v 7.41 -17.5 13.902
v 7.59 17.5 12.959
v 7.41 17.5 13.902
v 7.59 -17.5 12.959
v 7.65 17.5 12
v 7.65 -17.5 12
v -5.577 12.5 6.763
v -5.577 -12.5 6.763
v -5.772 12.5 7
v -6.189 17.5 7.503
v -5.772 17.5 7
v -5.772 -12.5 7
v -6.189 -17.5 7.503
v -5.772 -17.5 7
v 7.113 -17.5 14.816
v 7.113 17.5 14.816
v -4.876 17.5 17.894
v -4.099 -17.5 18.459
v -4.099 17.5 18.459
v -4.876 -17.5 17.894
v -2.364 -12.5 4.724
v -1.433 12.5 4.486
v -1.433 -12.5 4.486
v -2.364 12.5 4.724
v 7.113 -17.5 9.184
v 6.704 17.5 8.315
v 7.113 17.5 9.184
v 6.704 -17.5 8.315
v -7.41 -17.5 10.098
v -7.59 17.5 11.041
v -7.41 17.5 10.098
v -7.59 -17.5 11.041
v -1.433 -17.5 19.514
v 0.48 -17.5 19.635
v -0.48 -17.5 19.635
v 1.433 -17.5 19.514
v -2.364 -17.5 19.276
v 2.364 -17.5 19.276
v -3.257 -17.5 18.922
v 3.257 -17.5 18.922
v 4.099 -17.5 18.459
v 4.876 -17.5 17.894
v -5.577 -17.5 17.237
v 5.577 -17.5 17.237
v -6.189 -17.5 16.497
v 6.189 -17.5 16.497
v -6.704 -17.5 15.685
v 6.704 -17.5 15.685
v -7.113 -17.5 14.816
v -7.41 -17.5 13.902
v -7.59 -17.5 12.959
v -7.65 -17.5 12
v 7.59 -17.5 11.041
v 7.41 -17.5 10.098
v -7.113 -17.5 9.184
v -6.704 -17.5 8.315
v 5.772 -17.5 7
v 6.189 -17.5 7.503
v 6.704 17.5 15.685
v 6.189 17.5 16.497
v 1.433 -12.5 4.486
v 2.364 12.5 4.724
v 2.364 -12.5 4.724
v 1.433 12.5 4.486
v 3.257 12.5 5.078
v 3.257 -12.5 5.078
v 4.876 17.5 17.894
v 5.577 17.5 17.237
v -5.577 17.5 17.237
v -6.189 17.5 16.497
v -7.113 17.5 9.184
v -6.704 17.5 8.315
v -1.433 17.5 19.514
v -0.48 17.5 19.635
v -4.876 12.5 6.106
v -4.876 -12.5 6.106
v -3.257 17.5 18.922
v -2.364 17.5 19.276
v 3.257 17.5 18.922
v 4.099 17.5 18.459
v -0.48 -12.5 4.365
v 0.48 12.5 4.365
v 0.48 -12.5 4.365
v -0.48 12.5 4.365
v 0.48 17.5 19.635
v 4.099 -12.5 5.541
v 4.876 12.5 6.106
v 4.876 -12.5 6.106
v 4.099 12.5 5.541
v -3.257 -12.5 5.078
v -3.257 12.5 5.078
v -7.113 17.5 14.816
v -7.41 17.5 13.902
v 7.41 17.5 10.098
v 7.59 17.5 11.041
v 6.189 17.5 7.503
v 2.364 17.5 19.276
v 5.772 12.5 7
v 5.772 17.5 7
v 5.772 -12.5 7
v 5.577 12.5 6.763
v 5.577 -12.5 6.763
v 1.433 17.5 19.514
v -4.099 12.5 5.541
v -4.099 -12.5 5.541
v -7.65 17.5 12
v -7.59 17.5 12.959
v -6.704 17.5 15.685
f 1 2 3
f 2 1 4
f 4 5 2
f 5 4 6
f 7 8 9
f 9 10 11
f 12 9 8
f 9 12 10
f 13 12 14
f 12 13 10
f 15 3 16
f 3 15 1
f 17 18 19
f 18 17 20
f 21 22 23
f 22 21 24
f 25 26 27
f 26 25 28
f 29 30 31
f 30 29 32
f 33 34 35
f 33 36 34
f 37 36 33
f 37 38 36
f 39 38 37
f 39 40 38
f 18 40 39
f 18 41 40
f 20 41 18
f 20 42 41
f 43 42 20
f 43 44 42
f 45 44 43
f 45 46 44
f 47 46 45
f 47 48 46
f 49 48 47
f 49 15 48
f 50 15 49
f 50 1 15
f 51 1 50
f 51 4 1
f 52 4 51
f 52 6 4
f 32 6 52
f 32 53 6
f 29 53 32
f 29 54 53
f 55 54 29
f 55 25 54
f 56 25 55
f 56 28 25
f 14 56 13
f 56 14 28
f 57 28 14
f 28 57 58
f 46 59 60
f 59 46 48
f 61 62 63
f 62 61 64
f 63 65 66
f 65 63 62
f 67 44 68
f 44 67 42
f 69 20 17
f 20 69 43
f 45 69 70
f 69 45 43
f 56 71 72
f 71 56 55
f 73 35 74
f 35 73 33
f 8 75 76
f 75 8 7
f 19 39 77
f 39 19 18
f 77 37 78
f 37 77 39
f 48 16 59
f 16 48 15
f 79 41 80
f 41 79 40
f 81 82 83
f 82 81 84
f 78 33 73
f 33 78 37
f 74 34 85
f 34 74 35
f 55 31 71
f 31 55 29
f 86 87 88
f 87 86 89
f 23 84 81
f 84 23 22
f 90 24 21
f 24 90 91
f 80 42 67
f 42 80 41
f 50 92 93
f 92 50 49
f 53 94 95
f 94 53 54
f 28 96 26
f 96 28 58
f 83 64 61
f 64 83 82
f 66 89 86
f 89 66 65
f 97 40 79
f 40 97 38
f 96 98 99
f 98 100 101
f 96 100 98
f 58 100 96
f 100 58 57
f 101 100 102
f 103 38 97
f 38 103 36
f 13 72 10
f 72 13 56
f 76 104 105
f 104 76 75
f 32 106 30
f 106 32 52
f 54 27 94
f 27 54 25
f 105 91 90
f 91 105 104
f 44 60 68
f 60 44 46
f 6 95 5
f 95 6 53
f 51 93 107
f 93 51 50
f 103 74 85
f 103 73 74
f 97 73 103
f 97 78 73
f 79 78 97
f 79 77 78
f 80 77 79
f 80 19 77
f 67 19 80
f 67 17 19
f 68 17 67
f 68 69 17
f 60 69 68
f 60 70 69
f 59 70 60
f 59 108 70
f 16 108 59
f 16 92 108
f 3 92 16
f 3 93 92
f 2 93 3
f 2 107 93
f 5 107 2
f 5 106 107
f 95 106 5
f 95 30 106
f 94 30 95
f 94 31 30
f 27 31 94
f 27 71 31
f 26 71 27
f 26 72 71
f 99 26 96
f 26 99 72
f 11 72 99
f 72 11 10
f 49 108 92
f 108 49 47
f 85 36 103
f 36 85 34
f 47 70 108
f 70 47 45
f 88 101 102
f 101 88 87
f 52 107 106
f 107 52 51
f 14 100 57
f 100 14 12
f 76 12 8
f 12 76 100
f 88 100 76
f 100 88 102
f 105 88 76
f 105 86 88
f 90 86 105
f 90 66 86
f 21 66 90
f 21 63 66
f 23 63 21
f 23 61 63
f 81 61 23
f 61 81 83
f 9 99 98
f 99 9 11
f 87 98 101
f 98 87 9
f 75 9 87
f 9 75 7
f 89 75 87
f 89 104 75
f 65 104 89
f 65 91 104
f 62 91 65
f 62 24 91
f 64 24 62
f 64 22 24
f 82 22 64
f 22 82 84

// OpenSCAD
// file: polyholes.scad
// MK2Clone r2
// based on Mendel90
//
// GNU GPL v2
// nop.head@gmail.com
// hydraraptor.blogspot.com
//
// See http://hydraraptor.blogspot.com/2011/02/polyholes.html
//
function sides(r) = max(round(4 *r),3);
function correctedRadius(r,n) = 0.1 + r / cos(180 / n);
function correctedDiameter(d) = 0.2 + d / cos(180 / sides(d / 2));

module polyCircle(r, center = false) {
    n = sides(r);
    circle(r = correctedRadius(r,n), $fn = n, center = center);
}

module poly_circle(r, center = false) {
	polyCircle(r, center);
}

module polyCylinder(r, h, center = false) {
    n = sides(r);
    cylinder(h = h, r = correctedRadius(r,n), $fn = n, center = center);
}

module poly_cylinder(r, h, center = false) {
	polyCylinder(r,h,center);
}

module polydCylinder(r, center = false) {
    n = sides(r);
    r = correctedRadius(r,n);
    cylinder(h = h, r = r, $fn = n, center = center);
    translate([0, -r, 0])
        cube([r, 2 * r, h]);
}

module poly_d_cylinder(r, center = false) {
	polydCylinder(r,center);
}
// main file
// MK2Clone r2
// based on PRUSA iteration3
// Bearing holders
// GNU GPL v3
// Josef Průša <iam@josefprusa.cz> and contributors
// http://www.reprap.org/wiki/Prusa_Mendel
// http://prusamendel.org

use <polyholes.scad>

bearing_diameter = 14.9;

module horizontal_bearing_base(bearings=1){
 translate(v=[0,0,6]) cube(size = [24,8+bearings*25,12], center = true);	
}

module horizontal_bearing_holes(bearings=1){
 cutter_lenght = 10+bearings*25;
 one_holder_lenght = 8+25;
 holder_lenght = 8+bearings*25;
 
 // Main bearing cut
 difference(){
  translate(v=[0,0,12]) rotate(a=[90,0,0]) translate(v=[0,0,-cutter_lenght/2]) cylinder(h = cutter_lenght, r=(bearing_diameter/2)+0.2, $fn=50);
  // Bearing retainers
  translate(v=[0,1-holder_lenght/2,3]) cube(size = [24,6,8], center = true);
  translate(v=[0,-1+holder_lenght/2,3]) cube(size = [24,6,8], center = true);
 }
 
 // Ziptie cutouts
 ziptie_cut_ofset = 0;
 for ( i = [0 : bearings-1] ){
  // For easier positioning I move them by half of one 
  // bearing holder then add each bearign lenght and then center again
  translate(v=[0,-holder_lenght/2,0]) translate(v=[0,one_holder_lenght/2+i*25,0]) difference(){
   union(){
    translate(v=[0,2-8.5,12]) rotate(a=[90,0,0]) translate(v=[0,0,0]) cylinder(h = 4, r=11.5, $fn=50);
    translate(v=[0,2+8.5,12]) rotate(a=[90,0,0]) translate(v=[0,0,0]) cylinder(h = 4, r=11.5, $fn=50);
   }
   translate(v=[0,12,12]) rotate(a=[90,0,0]) translate(v=[0,0,0]) cylinder(h = 24, r=9, $fn=50);
  }
 }
 
}
 
module horizontal_bearing_holes_nozip(bearings=1){
 cutter_lenght = 10+bearings*25;
 one_holder_lenght = 8+25;
 holder_lenght = 8+bearings*25;
 
 // Main bearing cut
 difference(){
  translate(v=[0,0,12]) rotate(a=[90,0,0]) translate(v=[0,0,-cutter_lenght/2]) cylinder(h = cutter_lenght, r=(bearing_diameter/2)+0.2, $fn=50);
  // Bearing retainers
  translate(v=[0,1-holder_lenght/2,3]) cube(size = [24,6,8], center = true);
  translate(v=[0,-1+holder_lenght/2,3]) cube(size = [24,6,8], center = true);
 }
 
}


thinwall = 3;
bearing_size = bearing_diameter + 2 * thinwall;

module vertical_bearing_base(){
 translate(v=[-2-bearing_size/4,0,29]) cube(size = [4+bearing_size/2,bearing_size,58], center = true);
 cylinder(h = 58, r=bearing_size/2, $fn = 90);
}

module vertical_bearing_holes(){
  translate(v=[0,0,-1]) poly_cylinder(h = 62, r=(bearing_diameter/2));
  translate(v=[0,0,-0.1]) cylinder(r1=(bearing_diameter/2)+0.7,r2=(bearing_diameter/2), h=0.5);
  rotate(a=[0,0,-40]) translate(v=[bearing_diameter/2-2.9,-0.5,0.5]) cube(size = [thinwall*2,1,62]);

}

//difference(){
//vertical_bearing_base();
//vertical_bearing_holes();
//}
//horizontal_bearing_test();
//horizontal_bearing_base(1);
//horizontal_bearing_holes(1);
horizontal_bearing_holes_nozip(1);
